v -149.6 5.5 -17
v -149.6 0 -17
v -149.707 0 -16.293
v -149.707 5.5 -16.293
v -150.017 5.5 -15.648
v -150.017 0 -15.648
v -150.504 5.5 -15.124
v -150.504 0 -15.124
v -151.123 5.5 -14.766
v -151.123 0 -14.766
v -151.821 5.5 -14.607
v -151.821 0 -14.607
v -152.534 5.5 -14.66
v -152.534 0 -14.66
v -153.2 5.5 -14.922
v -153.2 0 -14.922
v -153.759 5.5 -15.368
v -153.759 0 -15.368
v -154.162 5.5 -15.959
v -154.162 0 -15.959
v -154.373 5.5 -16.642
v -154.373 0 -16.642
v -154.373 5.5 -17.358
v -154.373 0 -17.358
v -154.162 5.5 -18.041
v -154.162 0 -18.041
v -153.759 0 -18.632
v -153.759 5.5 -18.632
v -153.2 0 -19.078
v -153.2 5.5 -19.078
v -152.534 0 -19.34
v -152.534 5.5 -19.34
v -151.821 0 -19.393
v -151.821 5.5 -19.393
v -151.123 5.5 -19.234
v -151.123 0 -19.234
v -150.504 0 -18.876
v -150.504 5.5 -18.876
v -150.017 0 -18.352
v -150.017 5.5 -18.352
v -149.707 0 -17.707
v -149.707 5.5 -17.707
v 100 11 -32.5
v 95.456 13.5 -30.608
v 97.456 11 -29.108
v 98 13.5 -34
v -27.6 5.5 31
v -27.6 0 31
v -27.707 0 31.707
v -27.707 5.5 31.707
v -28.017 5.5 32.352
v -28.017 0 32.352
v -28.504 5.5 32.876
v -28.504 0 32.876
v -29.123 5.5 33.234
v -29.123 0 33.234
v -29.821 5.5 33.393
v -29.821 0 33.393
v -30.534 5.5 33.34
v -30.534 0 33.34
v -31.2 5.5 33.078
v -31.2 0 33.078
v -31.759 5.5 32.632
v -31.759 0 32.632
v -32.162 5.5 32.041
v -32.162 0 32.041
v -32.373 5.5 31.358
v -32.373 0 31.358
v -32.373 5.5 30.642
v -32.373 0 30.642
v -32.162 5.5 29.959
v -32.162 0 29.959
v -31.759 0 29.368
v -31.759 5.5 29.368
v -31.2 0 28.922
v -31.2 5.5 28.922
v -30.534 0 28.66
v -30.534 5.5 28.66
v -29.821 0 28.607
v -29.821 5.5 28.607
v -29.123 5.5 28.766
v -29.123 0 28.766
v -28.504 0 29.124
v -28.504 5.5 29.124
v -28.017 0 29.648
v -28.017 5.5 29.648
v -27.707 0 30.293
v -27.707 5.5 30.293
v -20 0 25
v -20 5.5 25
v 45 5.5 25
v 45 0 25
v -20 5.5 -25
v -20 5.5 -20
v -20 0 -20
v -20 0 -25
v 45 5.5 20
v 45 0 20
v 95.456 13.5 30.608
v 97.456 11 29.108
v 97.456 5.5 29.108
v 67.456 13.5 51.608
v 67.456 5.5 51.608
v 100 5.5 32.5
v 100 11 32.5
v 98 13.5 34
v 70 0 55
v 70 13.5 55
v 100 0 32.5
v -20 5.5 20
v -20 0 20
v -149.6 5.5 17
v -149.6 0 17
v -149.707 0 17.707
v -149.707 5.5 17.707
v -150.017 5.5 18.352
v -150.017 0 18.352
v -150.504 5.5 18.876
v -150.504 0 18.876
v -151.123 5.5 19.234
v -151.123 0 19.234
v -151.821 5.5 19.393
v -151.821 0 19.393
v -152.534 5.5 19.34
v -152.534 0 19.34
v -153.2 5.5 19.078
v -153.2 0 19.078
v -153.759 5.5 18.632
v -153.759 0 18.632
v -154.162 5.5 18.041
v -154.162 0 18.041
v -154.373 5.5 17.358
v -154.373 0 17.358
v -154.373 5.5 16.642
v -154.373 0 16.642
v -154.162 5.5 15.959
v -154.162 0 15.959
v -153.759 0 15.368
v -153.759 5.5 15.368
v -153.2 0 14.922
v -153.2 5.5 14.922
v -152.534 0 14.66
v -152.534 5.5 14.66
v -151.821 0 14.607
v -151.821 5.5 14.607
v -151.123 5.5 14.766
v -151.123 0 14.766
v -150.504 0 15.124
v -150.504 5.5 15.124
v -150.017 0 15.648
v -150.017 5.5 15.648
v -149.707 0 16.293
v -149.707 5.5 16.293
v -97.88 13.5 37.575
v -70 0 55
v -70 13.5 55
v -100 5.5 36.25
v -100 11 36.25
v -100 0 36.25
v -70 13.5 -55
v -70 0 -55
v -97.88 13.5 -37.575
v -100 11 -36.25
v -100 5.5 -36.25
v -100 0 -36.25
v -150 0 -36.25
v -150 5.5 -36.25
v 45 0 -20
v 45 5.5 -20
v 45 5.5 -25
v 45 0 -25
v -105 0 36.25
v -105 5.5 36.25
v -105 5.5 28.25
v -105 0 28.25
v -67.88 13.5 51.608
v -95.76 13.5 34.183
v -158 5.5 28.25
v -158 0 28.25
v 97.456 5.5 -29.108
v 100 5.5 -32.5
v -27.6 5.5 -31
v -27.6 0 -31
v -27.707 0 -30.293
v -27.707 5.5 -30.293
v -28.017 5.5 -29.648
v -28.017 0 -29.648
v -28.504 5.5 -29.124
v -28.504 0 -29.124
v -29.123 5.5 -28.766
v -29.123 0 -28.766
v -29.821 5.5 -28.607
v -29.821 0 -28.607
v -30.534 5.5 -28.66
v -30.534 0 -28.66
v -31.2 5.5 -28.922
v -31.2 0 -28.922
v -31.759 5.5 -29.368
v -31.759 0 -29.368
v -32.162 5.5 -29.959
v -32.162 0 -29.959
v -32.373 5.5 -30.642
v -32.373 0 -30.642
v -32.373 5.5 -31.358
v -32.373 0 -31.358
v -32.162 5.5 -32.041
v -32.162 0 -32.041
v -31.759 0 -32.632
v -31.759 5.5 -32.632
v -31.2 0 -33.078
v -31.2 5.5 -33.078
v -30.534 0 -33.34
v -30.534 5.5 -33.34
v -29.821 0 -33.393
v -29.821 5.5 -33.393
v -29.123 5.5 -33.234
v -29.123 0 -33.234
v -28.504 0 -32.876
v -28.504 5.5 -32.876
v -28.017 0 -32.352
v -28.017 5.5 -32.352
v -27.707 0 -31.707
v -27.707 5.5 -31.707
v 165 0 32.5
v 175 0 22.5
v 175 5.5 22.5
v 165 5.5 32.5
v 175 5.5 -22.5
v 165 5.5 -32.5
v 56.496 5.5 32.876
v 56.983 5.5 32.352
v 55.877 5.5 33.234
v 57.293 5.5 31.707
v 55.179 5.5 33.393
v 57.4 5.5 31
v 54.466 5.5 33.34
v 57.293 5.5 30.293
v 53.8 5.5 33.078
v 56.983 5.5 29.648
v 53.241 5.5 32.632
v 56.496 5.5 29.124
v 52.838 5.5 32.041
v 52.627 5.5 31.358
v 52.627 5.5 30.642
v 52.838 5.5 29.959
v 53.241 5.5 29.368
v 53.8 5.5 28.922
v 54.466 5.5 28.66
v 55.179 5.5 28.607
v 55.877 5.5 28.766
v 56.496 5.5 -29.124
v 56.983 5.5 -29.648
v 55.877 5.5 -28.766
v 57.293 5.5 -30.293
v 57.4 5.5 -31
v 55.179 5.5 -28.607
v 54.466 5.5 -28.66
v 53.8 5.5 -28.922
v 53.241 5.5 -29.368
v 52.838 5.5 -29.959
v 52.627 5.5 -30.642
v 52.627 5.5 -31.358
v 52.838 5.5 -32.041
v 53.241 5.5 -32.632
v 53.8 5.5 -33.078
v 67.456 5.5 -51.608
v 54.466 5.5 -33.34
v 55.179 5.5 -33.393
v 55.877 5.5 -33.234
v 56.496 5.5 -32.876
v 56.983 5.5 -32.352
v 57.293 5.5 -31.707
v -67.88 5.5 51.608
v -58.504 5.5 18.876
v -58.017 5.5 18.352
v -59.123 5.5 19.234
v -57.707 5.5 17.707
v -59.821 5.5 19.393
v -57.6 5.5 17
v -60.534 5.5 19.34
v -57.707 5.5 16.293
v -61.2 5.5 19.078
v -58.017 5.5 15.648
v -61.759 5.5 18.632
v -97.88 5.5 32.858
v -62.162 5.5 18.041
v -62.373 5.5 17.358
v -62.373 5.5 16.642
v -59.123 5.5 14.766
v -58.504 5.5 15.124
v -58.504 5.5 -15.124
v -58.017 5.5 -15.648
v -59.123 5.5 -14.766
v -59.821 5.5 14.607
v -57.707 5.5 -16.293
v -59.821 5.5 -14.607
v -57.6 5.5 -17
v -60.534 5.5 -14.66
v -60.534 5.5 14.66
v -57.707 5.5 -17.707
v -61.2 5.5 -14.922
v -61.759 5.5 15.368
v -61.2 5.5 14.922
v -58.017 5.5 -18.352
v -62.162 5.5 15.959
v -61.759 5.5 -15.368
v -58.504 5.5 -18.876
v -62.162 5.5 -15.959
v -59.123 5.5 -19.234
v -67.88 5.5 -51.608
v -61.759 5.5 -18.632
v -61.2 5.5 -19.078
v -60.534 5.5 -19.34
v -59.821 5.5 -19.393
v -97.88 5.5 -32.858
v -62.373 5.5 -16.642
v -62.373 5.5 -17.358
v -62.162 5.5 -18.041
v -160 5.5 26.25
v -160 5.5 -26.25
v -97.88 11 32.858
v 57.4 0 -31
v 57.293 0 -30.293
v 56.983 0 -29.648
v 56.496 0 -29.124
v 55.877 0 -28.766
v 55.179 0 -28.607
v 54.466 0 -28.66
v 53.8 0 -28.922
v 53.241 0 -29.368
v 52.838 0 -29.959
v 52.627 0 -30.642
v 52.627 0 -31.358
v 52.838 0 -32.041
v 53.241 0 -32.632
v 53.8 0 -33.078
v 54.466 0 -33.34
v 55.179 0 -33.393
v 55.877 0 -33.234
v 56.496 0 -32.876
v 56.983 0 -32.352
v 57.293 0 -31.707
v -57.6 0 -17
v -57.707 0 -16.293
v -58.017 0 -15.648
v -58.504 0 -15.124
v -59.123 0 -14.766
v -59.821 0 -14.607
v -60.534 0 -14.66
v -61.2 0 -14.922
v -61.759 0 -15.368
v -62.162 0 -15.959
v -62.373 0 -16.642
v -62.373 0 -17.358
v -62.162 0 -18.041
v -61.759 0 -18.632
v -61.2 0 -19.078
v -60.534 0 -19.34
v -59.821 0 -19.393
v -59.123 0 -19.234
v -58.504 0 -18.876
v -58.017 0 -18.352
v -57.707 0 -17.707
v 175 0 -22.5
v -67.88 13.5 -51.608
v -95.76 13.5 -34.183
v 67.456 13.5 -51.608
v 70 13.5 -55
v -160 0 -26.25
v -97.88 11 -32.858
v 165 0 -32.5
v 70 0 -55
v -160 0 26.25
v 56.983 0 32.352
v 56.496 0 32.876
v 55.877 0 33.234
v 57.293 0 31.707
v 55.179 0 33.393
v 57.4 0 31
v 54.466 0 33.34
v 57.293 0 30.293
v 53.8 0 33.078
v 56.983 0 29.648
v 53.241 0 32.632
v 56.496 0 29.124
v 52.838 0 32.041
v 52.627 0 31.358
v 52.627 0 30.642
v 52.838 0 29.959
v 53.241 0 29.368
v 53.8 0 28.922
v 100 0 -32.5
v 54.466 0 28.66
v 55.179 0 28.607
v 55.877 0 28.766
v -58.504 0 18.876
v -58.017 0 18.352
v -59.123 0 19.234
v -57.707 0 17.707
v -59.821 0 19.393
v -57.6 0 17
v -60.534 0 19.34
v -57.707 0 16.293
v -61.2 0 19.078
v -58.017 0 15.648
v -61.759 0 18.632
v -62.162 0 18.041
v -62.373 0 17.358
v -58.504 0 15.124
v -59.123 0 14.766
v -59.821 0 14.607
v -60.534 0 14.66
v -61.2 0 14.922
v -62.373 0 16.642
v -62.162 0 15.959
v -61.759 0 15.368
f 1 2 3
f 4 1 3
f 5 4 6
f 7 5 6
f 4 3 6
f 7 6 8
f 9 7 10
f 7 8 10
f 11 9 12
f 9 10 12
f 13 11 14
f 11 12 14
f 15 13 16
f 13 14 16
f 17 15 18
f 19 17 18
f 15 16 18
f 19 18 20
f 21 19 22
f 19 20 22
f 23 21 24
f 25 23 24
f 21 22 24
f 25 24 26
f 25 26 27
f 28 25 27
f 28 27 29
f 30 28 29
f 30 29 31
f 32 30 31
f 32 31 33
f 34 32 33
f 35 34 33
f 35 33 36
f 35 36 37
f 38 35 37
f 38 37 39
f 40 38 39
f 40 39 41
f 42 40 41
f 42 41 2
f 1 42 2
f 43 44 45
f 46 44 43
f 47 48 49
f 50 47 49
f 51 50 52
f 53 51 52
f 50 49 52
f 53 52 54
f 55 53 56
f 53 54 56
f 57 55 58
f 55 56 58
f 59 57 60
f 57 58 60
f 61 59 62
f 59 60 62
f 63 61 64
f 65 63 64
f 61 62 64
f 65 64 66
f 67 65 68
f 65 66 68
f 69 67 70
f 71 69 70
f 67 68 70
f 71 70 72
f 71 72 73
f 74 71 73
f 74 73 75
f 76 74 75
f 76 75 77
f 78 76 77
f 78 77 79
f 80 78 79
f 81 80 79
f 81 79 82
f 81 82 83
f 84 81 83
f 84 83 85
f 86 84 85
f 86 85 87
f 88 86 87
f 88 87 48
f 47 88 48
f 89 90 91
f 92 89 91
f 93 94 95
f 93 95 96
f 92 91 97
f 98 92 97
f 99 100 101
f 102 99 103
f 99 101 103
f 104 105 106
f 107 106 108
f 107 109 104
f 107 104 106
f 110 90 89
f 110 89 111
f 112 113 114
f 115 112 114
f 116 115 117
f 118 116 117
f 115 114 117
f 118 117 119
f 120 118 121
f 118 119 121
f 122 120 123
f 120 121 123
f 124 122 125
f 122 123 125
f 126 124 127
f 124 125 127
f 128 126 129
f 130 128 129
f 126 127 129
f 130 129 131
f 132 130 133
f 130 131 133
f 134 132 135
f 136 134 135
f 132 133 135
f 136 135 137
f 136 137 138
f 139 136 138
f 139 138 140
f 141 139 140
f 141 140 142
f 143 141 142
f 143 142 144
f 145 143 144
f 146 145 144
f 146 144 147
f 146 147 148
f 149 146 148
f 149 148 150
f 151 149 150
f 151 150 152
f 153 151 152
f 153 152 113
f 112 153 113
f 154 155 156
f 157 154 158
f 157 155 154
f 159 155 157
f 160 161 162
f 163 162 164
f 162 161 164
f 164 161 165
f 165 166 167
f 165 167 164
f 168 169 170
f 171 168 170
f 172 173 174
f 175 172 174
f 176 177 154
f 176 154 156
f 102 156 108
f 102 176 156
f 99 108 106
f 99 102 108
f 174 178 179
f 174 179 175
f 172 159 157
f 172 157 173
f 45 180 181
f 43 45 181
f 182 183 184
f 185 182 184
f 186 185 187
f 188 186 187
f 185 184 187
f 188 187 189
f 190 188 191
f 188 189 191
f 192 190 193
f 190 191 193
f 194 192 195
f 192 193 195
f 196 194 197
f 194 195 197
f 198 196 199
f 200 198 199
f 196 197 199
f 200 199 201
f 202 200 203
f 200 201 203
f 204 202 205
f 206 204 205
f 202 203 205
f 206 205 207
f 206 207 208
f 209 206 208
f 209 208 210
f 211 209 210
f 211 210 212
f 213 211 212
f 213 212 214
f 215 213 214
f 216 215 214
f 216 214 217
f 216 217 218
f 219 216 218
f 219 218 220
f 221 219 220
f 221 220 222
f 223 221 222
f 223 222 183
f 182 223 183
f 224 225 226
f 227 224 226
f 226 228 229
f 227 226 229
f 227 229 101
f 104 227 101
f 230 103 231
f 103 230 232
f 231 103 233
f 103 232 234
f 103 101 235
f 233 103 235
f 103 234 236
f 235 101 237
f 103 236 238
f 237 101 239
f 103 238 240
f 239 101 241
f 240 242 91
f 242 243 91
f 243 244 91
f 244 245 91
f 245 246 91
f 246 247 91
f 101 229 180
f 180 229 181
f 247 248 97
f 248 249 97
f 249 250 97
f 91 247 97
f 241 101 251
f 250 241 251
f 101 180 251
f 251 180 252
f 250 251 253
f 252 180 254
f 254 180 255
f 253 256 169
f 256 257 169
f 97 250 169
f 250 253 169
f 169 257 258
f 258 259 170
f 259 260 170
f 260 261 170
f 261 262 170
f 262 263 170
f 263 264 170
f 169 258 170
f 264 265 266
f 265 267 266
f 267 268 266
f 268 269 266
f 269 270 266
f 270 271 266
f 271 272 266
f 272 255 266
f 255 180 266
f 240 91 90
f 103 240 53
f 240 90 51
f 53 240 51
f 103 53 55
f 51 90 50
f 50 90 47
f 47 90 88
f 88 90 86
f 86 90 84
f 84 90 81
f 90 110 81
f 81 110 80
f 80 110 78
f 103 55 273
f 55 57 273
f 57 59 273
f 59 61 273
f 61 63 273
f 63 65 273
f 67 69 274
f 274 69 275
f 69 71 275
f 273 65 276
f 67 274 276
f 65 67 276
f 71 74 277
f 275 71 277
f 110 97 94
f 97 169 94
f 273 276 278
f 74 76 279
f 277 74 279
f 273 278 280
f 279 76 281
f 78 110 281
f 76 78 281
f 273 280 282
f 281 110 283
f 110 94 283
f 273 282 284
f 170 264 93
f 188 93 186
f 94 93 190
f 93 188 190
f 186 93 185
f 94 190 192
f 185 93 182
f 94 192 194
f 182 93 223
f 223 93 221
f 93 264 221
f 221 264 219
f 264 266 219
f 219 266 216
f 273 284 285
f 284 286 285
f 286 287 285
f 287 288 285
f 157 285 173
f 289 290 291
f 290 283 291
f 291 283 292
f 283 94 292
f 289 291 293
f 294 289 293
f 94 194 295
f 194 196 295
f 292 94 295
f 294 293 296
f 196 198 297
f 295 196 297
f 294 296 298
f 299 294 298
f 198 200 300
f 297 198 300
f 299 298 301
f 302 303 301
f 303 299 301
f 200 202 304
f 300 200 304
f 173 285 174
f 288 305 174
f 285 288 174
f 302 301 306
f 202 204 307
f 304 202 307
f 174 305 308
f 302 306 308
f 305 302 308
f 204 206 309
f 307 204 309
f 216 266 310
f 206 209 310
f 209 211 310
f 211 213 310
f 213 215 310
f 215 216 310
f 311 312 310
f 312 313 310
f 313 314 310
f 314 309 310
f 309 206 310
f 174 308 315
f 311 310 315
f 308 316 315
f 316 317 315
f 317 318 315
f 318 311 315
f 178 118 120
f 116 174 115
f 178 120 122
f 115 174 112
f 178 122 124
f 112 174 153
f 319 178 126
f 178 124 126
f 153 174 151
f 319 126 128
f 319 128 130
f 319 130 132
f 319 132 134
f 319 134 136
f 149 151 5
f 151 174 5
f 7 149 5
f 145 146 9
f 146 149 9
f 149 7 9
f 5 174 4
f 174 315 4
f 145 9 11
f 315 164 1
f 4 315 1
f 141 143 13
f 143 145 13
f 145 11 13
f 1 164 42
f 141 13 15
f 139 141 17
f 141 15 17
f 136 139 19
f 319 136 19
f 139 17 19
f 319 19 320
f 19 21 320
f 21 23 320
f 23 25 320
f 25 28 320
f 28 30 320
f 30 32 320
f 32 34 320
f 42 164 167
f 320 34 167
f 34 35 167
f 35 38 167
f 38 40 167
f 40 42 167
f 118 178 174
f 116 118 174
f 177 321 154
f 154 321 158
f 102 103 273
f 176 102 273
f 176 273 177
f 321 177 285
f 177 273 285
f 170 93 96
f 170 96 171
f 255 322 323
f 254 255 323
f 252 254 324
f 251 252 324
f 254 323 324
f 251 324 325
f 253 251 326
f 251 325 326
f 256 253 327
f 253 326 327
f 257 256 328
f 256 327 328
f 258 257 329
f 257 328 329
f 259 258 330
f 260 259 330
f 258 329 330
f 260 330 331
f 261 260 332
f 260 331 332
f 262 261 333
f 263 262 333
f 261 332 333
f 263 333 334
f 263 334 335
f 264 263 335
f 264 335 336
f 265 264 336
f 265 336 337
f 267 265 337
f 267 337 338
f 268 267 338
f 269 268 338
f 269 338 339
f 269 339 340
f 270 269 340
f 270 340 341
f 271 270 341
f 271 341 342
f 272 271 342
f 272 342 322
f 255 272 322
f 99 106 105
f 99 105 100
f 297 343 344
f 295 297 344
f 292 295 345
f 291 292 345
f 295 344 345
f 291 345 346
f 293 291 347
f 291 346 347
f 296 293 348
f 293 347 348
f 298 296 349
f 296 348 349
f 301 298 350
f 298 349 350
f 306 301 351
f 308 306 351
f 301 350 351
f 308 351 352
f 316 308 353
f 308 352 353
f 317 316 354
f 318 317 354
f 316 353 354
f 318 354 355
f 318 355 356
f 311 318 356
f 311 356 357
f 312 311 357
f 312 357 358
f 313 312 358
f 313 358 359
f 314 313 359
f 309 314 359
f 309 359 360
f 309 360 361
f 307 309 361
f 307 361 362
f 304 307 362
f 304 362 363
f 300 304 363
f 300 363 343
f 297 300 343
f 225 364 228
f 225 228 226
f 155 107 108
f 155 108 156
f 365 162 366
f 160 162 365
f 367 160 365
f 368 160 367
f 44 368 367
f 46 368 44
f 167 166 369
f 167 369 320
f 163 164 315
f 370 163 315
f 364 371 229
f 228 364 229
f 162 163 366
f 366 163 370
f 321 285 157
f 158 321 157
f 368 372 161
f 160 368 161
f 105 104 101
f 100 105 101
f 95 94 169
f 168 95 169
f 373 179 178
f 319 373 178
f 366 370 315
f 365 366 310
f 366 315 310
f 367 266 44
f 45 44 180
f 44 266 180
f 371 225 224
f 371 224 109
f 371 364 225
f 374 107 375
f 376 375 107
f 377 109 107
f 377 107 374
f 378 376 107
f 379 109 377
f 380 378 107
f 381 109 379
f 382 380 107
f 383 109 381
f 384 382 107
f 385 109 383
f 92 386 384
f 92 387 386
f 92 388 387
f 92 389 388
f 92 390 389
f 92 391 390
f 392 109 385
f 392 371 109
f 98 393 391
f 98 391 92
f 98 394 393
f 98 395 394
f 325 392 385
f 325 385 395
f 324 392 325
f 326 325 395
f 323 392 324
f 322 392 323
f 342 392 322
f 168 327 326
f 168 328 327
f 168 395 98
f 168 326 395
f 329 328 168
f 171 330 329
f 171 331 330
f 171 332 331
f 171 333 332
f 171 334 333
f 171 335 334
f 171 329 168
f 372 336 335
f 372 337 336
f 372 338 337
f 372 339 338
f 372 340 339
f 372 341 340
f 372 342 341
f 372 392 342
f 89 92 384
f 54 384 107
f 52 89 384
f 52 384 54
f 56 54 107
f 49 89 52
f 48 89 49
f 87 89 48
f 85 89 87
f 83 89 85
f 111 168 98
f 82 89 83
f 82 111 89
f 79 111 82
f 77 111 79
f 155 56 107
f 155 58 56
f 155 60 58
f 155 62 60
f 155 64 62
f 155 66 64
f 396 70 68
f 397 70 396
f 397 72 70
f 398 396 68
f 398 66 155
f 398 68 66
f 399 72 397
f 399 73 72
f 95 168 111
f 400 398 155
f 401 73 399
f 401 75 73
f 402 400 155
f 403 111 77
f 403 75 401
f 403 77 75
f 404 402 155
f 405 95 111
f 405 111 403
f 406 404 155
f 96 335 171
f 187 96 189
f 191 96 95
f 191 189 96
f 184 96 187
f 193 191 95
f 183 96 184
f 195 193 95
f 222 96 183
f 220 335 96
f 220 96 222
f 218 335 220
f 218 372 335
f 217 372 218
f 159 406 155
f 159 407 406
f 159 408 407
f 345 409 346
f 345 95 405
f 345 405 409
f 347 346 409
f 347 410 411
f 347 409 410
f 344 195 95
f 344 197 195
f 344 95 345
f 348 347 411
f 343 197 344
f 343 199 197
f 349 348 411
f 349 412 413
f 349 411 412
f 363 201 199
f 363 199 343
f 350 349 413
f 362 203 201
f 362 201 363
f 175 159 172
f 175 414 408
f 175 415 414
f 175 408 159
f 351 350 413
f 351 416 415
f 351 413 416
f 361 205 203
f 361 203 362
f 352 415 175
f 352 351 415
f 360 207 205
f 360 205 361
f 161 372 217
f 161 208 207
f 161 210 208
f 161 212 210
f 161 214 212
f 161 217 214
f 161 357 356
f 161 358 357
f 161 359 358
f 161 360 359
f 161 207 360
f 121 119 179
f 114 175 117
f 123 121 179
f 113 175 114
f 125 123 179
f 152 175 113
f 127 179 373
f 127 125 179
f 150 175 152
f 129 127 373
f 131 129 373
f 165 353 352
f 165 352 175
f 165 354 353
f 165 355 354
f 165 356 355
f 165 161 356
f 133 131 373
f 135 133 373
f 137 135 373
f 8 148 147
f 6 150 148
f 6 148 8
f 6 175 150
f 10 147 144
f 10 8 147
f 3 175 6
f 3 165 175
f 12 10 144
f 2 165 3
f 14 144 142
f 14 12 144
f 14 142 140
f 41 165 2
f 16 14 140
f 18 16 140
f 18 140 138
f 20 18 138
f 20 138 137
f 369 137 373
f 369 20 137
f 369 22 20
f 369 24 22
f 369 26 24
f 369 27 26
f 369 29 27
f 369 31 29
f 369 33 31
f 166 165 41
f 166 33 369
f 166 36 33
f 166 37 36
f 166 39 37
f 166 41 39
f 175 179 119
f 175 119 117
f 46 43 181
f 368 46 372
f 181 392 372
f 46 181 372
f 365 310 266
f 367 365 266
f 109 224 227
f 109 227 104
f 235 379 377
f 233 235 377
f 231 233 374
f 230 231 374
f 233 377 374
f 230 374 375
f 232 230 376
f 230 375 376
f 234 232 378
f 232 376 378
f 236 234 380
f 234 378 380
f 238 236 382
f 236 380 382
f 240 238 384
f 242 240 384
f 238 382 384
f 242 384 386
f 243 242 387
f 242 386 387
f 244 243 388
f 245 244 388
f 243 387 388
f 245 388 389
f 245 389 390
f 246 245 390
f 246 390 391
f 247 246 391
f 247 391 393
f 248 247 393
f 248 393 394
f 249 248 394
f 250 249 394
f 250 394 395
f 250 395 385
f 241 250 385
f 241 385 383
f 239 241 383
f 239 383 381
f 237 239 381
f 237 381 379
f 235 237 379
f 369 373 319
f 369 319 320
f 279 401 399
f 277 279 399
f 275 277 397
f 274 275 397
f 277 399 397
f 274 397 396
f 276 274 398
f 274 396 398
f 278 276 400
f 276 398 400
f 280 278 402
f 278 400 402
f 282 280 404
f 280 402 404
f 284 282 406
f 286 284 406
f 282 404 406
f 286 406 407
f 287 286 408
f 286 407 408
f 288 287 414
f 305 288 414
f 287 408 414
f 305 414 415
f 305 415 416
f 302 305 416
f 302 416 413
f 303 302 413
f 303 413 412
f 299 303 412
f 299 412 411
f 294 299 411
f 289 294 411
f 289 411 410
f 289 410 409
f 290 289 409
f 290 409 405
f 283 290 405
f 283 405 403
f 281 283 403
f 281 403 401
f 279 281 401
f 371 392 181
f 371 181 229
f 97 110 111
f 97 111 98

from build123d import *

# Parameters (mm, degrees)
BOSS_EXTRUDE1_DEPTH  = 5.5
CHASSIS_WALLS1_DEPTH = 8
CHAMFER1_SIZE        = 10
CHAMFER2_SIZE        = 10
CHAMFER3_SIZE        = 2.5
SKETCH4_R            = 2.4
CUT_EXTRUDE1_DEPTH   = 10
SKETCH5_W            = 55
SKETCH5_H            = 8
CUT_EXTRUDE2_DEPTH   = 10
SKETCH6_W            = 65
SKETCH6_H            = 5
CUT_EXTRUDE3_DEPTH   = 6.5


with BuildPart() as part:
    # Sketch1 → Boss-Extrude1 (new body)
    with BuildSketch(Plane(origin=(0, 0, 0), x_dir=(1, 0, 0), z_dir=(0, 1, 0))):
        Polygon((-100, 36.25), (-70, 55), (70, 55), (100, 32.5), (175, 32.5), (175, -32.5), (100, -32.5), (70, -55), (-70, -55), (-100, -36.25), (-160, -36.25), (-160, 36.25), align=None)
    extrude(amount=BOSS_EXTRUDE1_DEPTH)

    # Sketch3 → Chassis-Walls1 (add)
    with BuildSketch(Plane(origin=(0, 5.5, 0), x_dir=(1, 0, 0), z_dir=(0, 1, 0))):
        Polygon((0, 55), (-70, 55), (-100, 36.25), (-97.88000424, 32.858006784), (-67.88000424, 51.608006784), (0, 51.608006784), (67.456005088, 51.608006784), (97.456005088, 29.108006784), (100, 32.5), (70, 55), align=None)
        Polygon((67.456005088, -51.608006784), (0, -51.608006784), (-67.88000424, -51.608006784), (-97.88000424, -32.858006784), (-100, -36.25), (-70, -55), (0, -55), (70, -55), (100, -32.5), (97.456005088, -29.108006784), align=None)
    extrude(amount=CHASSIS_WALLS1_DEPTH)

    # Chamfer1
    chamfer1_edges = [part.edges().sort_by_distance(p)[0] for p in [
        (-160, 2.75, 36.25),
        (-160, 2.75, -36.25),
    ]]
    chamfer(chamfer1_edges, length=CHAMFER1_SIZE)

    # Chamfer2
    chamfer2_edges = [part.edges().sort_by_distance(p)[0] for p in [
        (175, 2.75, -32.5),
        (175, 2.75, 32.5),
    ]]
    chamfer(chamfer2_edges, length=CHAMFER2_SIZE)

    # Chamfer3
    chamfer3_edges = [part.edges().sort_by_distance(p)[0] for p in [
        (-98.94000212, 13.5, -34.554003392),
        (98.728002544, 13.5, -30.804003392),
        (-98.94000212, 13.5, 34.554003392),
        (98.728002544, 13.5, 30.804003392),
    ]]
    chamfer(chamfer3_edges, length=CHAMFER3_SIZE)

    # Sketch4 → Cut-Extrude1 (cut)
    with BuildSketch(Plane.XZ):
        with Locations((-152, 17)):
            Circle(SKETCH4_R)
        with Locations((-60, 17)):
            Circle(SKETCH4_R)
        with Locations((-60, -17)):
            Circle(SKETCH4_R)
        with Locations((-152, -17)):
            Circle(SKETCH4_R)
        with Locations((-30, 31)):
            Circle(SKETCH4_R)
        with Locations((55, 31)):
            Circle(SKETCH4_R)
        with Locations((55, -31)):
            Circle(SKETCH4_R)
        with Locations((-30, -31)):
            Circle(SKETCH4_R)
    extrude(amount=-CUT_EXTRUDE1_DEPTH, mode=Mode.SUBTRACT)

    # Sketch5 → Cut-Extrude2 (cut)
    with BuildSketch(Plane(origin=(0, 5.5, 0), x_dir=(1, 0, 0), z_dir=(0, 1, 0))):
        with Locations((-132.5, -32.25)):
            Rectangle(SKETCH5_W, SKETCH5_H)
    extrude(amount=-CUT_EXTRUDE2_DEPTH, mode=Mode.SUBTRACT)

    # Sketch6 → Cut-Extrude3 (cut, through all)
    with BuildSketch(Plane(origin=(0, 5.5, 0), x_dir=(1, 0, 0), z_dir=(0, 1, 0))):
        with Locations((12.5, 22.5)):
            Rectangle(SKETCH6_W, SKETCH6_H)
        with Locations((12.5, -22.5)):
            Rectangle(SKETCH6_W, SKETCH6_H)
    extrude(amount=-CUT_EXTRUDE3_DEPTH, mode=Mode.SUBTRACT)


solid = part.part
